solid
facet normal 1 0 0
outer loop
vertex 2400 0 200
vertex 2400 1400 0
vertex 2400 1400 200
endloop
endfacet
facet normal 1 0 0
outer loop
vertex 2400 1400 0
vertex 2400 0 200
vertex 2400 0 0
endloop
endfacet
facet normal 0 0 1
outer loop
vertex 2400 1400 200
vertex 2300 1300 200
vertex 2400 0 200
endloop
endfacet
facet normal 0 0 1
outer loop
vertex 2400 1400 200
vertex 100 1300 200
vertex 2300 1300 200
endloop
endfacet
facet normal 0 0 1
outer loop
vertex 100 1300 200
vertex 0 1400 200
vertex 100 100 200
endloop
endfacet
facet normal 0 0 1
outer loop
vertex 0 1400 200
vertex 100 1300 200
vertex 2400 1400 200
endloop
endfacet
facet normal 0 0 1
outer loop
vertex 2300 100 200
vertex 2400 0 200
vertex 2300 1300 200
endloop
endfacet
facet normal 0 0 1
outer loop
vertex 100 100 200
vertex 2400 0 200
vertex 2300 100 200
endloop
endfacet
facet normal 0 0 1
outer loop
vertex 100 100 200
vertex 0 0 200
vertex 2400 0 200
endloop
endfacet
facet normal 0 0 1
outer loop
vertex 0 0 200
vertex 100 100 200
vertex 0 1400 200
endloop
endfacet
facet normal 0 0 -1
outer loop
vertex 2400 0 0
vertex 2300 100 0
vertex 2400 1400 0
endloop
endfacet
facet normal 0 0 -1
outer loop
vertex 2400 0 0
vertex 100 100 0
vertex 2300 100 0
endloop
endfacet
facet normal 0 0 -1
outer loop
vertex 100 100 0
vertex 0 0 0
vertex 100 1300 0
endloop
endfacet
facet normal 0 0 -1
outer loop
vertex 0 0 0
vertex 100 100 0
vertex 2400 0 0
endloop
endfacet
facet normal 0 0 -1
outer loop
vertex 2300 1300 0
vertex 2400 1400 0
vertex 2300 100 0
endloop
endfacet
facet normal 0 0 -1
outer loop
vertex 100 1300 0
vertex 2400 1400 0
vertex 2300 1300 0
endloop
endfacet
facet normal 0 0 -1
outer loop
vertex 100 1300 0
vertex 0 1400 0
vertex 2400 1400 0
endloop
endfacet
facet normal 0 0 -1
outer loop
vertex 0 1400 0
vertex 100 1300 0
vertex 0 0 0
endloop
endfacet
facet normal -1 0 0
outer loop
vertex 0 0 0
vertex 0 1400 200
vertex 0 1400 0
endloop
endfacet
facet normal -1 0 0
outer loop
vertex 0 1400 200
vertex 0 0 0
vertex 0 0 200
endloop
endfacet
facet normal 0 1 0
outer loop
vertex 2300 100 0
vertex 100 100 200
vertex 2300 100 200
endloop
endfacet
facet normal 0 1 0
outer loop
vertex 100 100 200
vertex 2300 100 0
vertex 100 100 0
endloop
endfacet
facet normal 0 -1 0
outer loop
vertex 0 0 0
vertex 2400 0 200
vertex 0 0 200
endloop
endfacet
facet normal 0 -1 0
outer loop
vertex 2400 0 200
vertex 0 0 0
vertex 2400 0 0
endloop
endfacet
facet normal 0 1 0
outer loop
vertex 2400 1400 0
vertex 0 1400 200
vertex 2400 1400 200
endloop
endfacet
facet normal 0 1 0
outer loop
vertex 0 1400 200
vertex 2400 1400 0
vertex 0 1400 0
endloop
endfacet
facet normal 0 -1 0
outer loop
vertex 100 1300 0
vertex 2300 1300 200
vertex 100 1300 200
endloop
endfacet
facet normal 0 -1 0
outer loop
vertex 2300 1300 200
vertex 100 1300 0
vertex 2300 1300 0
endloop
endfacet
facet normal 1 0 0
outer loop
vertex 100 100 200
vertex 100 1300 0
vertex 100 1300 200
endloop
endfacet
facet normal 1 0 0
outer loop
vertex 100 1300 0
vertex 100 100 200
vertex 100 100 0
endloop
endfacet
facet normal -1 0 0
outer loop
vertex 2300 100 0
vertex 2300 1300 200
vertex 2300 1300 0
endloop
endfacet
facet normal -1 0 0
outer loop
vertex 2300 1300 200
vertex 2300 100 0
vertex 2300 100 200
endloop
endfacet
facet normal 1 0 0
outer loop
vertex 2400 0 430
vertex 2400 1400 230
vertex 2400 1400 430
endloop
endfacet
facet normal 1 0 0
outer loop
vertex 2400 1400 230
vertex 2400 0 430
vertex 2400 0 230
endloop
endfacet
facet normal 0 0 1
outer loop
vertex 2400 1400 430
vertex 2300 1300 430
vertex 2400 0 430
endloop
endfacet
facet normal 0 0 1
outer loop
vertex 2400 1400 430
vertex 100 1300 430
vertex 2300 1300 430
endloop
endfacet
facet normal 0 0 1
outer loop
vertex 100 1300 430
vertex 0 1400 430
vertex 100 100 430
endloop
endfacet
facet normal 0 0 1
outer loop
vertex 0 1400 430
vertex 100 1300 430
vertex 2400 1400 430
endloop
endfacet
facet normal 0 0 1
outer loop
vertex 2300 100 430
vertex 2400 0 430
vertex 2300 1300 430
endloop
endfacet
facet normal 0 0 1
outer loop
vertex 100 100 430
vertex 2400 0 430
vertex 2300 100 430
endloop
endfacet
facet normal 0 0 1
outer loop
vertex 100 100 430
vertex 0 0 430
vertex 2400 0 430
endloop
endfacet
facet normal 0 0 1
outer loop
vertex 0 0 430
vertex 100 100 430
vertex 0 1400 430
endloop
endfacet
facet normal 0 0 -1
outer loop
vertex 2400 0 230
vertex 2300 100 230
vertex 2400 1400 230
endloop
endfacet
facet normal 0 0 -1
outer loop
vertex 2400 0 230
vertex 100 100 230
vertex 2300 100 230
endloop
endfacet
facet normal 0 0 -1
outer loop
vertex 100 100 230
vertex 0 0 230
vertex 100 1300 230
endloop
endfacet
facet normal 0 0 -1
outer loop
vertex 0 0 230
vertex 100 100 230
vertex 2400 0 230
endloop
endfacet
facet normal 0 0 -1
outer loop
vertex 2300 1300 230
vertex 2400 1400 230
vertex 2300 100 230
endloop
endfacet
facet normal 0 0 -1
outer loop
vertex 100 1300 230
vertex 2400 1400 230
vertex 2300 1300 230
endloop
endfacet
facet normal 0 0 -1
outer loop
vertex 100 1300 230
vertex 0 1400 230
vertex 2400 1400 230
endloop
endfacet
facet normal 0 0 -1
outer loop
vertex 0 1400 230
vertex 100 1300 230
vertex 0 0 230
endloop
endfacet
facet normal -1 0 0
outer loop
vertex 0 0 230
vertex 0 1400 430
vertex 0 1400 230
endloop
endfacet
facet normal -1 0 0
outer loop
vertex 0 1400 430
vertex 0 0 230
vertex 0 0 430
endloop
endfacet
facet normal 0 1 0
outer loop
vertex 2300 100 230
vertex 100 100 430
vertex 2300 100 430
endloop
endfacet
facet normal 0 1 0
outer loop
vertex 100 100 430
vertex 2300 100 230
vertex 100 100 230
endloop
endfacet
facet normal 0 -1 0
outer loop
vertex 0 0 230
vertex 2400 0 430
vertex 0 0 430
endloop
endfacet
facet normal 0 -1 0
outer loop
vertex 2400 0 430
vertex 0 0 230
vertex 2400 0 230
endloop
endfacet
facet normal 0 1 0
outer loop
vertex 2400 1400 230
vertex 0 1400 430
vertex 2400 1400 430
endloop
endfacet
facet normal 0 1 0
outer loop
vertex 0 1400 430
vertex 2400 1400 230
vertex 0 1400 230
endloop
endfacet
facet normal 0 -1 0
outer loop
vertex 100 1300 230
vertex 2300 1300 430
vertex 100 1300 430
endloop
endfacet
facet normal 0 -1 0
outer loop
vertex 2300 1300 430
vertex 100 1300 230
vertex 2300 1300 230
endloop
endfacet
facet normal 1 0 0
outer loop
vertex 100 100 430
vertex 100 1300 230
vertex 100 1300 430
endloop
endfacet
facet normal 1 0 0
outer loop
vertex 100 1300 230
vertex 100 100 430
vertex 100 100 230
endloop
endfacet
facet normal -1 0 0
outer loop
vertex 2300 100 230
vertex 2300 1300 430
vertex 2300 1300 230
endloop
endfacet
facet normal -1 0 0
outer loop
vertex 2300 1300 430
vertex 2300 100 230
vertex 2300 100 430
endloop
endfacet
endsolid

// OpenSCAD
// Generated from plan.json; millimetres. Not a structural design.
// Open in OpenSCAD. Increase explode_mm to inspect courses.
explode_mm = 30;
$fn = 24;
show_fixing_paths = false;

// first-bed-01-C1-S
translate([0, 0, 0+0*explode_mm])
  color([0.70,0.52,0.33]) cube([2400, 100, 200]);
// first-bed-01-C1-N
translate([0, 1300, 0+0*explode_mm])
  color([0.70,0.52,0.33]) cube([2400, 100, 200]);
// first-bed-01-C1-W
translate([0, 100, 0+0*explode_mm])
  color([0.70,0.52,0.33]) cube([100, 1200, 200]);
// first-bed-01-C1-E
translate([2300, 100, 0+0*explode_mm])
  color([0.70,0.52,0.33]) cube([100, 1200, 200]);
// first-bed-01-C2-S
translate([0, 0, 200+1*explode_mm])
  color([0.70,0.52,0.33]) cube([2400, 100, 200]);
// first-bed-01-C2-N
translate([0, 1300, 200+1*explode_mm])
  color([0.70,0.52,0.33]) cube([2400, 100, 200]);
// first-bed-01-C2-W
translate([0, 100, 200+1*explode_mm])
  color([0.70,0.52,0.33]) cube([100, 1200, 200]);
// first-bed-01-C2-E
translate([2300, 100, 200+1*explode_mm])
  color([0.70,0.52,0.33]) cube([100, 1200, 200]);
if (show_fixing_paths) translate([50.0, 1400, 50.0+0*explode_mm]) rotate([90,0,0]) color([0.8,0.1,0.1]) cylinder(d=7, h=150);
if (show_fixing_paths) translate([50.0, 1400, 150.0+0*explode_mm]) rotate([90,0,0]) color([0.8,0.1,0.1]) cylinder(d=7, h=150);
if (show_fixing_paths) translate([2350.0, 1400, 50.0+0*explode_mm]) rotate([90,0,0]) color([0.8,0.1,0.1]) cylinder(d=7, h=150);
if (show_fixing_paths) translate([2350.0, 1400, 150.0+0*explode_mm]) rotate([90,0,0]) color([0.8,0.1,0.1]) cylinder(d=7, h=150);
if (show_fixing_paths) translate([50.0, 0, 50.0+0*explode_mm]) rotate([-90,0,0]) color([0.8,0.1,0.1]) cylinder(d=7, h=150);
if (show_fixing_paths) translate([50.0, 0, 150.0+0*explode_mm]) rotate([-90,0,0]) color([0.8,0.1,0.1]) cylinder(d=7, h=150);
if (show_fixing_paths) translate([2350.0, 0, 50.0+0*explode_mm]) rotate([-90,0,0]) color([0.8,0.1,0.1]) cylinder(d=7, h=150);
if (show_fixing_paths) translate([2350.0, 0, 150.0+0*explode_mm]) rotate([-90,0,0]) color([0.8,0.1,0.1]) cylinder(d=7, h=150);
if (show_fixing_paths) translate([2350.0, 300.0, 400+1*explode_mm]) rotate([180,0,0]) color([0.8,0.1,0.1]) cylinder(d=7, h=250);
if (show_fixing_paths) translate([2350.0, 700.0, 400+1*explode_mm]) rotate([180,0,0]) color([0.8,0.1,0.1]) cylinder(d=7, h=250);
if (show_fixing_paths) translate([2350.0, 1100.0, 400+1*explode_mm]) rotate([180,0,0]) color([0.8,0.1,0.1]) cylinder(d=7, h=250);
if (show_fixing_paths) translate([50.0, 1400, 250.0+1*explode_mm]) rotate([90,0,0]) color([0.8,0.1,0.1]) cylinder(d=7, h=150);
if (show_fixing_paths) translate([50.0, 1400, 350.0+1*explode_mm]) rotate([90,0,0]) color([0.8,0.1,0.1]) cylinder(d=7, h=150);
if (show_fixing_paths) translate([2350.0, 1400, 250.0+1*explode_mm]) rotate([90,0,0]) color([0.8,0.1,0.1]) cylinder(d=7, h=150);
if (show_fixing_paths) translate([2350.0, 1400, 350.0+1*explode_mm]) rotate([90,0,0]) color([0.8,0.1,0.1]) cylinder(d=7, h=150);
if (show_fixing_paths) translate([200.0, 1350.0, 400+1*explode_mm]) rotate([180,0,0]) color([0.8,0.1,0.1]) cylinder(d=7, h=250);
if (show_fixing_paths) translate([700.0, 1350.0, 400+1*explode_mm]) rotate([180,0,0]) color([0.8,0.1,0.1]) cylinder(d=7, h=250);
if (show_fixing_paths) translate([1200.0, 1350.0, 400+1*explode_mm]) rotate([180,0,0]) color([0.8,0.1,0.1]) cylinder(d=7, h=250);
if (show_fixing_paths) translate([1700.0, 1350.0, 400+1*explode_mm]) rotate([180,0,0]) color([0.8,0.1,0.1]) cylinder(d=7, h=250);
if (show_fixing_paths) translate([2200.0, 1350.0, 400+1*explode_mm]) rotate([180,0,0]) color([0.8,0.1,0.1]) cylinder(d=7, h=250);
if (show_fixing_paths) translate([50.0, 0, 250.0+1*explode_mm]) rotate([-90,0,0]) color([0.8,0.1,0.1]) cylinder(d=7, h=150);
if (show_fixing_paths) translate([50.0, 0, 350.0+1*explode_mm]) rotate([-90,0,0]) color([0.8,0.1,0.1]) cylinder(d=7, h=150);
if (show_fixing_paths) translate([2350.0, 0, 250.0+1*explode_mm]) rotate([-90,0,0]) color([0.8,0.1,0.1]) cylinder(d=7, h=150);
if (show_fixing_paths) translate([2350.0, 0, 350.0+1*explode_mm]) rotate([-90,0,0]) color([0.8,0.1,0.1]) cylinder(d=7, h=150);
if (show_fixing_paths) translate([200.0, 50.0, 400+1*explode_mm]) rotate([180,0,0]) color([0.8,0.1,0.1]) cylinder(d=7, h=250);
if (show_fixing_paths) translate([700.0, 50.0, 400+1*explode_mm]) rotate([180,0,0]) color([0.8,0.1,0.1]) cylinder(d=7, h=250);
if (show_fixing_paths) translate([1200.0, 50.0, 400+1*explode_mm]) rotate([180,0,0]) color([0.8,0.1,0.1]) cylinder(d=7, h=250);
if (show_fixing_paths) translate([1700.0, 50.0, 400+1*explode_mm]) rotate([180,0,0]) color([0.8,0.1,0.1]) cylinder(d=7, h=250);
if (show_fixing_paths) translate([2200.0, 50.0, 400+1*explode_mm]) rotate([180,0,0]) color([0.8,0.1,0.1]) cylinder(d=7, h=250);
if (show_fixing_paths) translate([50.0, 300.0, 400+1*explode_mm]) rotate([180,0,0]) color([0.8,0.1,0.1]) cylinder(d=7, h=250);
if (show_fixing_paths) translate([50.0, 700.0, 400+1*explode_mm]) rotate([180,0,0]) color([0.8,0.1,0.1]) cylinder(d=7, h=250);
if (show_fixing_paths) translate([50.0, 1100.0, 400+1*explode_mm]) rotate([180,0,0]) color([0.8,0.1,0.1]) cylinder(d=7, h=250);
